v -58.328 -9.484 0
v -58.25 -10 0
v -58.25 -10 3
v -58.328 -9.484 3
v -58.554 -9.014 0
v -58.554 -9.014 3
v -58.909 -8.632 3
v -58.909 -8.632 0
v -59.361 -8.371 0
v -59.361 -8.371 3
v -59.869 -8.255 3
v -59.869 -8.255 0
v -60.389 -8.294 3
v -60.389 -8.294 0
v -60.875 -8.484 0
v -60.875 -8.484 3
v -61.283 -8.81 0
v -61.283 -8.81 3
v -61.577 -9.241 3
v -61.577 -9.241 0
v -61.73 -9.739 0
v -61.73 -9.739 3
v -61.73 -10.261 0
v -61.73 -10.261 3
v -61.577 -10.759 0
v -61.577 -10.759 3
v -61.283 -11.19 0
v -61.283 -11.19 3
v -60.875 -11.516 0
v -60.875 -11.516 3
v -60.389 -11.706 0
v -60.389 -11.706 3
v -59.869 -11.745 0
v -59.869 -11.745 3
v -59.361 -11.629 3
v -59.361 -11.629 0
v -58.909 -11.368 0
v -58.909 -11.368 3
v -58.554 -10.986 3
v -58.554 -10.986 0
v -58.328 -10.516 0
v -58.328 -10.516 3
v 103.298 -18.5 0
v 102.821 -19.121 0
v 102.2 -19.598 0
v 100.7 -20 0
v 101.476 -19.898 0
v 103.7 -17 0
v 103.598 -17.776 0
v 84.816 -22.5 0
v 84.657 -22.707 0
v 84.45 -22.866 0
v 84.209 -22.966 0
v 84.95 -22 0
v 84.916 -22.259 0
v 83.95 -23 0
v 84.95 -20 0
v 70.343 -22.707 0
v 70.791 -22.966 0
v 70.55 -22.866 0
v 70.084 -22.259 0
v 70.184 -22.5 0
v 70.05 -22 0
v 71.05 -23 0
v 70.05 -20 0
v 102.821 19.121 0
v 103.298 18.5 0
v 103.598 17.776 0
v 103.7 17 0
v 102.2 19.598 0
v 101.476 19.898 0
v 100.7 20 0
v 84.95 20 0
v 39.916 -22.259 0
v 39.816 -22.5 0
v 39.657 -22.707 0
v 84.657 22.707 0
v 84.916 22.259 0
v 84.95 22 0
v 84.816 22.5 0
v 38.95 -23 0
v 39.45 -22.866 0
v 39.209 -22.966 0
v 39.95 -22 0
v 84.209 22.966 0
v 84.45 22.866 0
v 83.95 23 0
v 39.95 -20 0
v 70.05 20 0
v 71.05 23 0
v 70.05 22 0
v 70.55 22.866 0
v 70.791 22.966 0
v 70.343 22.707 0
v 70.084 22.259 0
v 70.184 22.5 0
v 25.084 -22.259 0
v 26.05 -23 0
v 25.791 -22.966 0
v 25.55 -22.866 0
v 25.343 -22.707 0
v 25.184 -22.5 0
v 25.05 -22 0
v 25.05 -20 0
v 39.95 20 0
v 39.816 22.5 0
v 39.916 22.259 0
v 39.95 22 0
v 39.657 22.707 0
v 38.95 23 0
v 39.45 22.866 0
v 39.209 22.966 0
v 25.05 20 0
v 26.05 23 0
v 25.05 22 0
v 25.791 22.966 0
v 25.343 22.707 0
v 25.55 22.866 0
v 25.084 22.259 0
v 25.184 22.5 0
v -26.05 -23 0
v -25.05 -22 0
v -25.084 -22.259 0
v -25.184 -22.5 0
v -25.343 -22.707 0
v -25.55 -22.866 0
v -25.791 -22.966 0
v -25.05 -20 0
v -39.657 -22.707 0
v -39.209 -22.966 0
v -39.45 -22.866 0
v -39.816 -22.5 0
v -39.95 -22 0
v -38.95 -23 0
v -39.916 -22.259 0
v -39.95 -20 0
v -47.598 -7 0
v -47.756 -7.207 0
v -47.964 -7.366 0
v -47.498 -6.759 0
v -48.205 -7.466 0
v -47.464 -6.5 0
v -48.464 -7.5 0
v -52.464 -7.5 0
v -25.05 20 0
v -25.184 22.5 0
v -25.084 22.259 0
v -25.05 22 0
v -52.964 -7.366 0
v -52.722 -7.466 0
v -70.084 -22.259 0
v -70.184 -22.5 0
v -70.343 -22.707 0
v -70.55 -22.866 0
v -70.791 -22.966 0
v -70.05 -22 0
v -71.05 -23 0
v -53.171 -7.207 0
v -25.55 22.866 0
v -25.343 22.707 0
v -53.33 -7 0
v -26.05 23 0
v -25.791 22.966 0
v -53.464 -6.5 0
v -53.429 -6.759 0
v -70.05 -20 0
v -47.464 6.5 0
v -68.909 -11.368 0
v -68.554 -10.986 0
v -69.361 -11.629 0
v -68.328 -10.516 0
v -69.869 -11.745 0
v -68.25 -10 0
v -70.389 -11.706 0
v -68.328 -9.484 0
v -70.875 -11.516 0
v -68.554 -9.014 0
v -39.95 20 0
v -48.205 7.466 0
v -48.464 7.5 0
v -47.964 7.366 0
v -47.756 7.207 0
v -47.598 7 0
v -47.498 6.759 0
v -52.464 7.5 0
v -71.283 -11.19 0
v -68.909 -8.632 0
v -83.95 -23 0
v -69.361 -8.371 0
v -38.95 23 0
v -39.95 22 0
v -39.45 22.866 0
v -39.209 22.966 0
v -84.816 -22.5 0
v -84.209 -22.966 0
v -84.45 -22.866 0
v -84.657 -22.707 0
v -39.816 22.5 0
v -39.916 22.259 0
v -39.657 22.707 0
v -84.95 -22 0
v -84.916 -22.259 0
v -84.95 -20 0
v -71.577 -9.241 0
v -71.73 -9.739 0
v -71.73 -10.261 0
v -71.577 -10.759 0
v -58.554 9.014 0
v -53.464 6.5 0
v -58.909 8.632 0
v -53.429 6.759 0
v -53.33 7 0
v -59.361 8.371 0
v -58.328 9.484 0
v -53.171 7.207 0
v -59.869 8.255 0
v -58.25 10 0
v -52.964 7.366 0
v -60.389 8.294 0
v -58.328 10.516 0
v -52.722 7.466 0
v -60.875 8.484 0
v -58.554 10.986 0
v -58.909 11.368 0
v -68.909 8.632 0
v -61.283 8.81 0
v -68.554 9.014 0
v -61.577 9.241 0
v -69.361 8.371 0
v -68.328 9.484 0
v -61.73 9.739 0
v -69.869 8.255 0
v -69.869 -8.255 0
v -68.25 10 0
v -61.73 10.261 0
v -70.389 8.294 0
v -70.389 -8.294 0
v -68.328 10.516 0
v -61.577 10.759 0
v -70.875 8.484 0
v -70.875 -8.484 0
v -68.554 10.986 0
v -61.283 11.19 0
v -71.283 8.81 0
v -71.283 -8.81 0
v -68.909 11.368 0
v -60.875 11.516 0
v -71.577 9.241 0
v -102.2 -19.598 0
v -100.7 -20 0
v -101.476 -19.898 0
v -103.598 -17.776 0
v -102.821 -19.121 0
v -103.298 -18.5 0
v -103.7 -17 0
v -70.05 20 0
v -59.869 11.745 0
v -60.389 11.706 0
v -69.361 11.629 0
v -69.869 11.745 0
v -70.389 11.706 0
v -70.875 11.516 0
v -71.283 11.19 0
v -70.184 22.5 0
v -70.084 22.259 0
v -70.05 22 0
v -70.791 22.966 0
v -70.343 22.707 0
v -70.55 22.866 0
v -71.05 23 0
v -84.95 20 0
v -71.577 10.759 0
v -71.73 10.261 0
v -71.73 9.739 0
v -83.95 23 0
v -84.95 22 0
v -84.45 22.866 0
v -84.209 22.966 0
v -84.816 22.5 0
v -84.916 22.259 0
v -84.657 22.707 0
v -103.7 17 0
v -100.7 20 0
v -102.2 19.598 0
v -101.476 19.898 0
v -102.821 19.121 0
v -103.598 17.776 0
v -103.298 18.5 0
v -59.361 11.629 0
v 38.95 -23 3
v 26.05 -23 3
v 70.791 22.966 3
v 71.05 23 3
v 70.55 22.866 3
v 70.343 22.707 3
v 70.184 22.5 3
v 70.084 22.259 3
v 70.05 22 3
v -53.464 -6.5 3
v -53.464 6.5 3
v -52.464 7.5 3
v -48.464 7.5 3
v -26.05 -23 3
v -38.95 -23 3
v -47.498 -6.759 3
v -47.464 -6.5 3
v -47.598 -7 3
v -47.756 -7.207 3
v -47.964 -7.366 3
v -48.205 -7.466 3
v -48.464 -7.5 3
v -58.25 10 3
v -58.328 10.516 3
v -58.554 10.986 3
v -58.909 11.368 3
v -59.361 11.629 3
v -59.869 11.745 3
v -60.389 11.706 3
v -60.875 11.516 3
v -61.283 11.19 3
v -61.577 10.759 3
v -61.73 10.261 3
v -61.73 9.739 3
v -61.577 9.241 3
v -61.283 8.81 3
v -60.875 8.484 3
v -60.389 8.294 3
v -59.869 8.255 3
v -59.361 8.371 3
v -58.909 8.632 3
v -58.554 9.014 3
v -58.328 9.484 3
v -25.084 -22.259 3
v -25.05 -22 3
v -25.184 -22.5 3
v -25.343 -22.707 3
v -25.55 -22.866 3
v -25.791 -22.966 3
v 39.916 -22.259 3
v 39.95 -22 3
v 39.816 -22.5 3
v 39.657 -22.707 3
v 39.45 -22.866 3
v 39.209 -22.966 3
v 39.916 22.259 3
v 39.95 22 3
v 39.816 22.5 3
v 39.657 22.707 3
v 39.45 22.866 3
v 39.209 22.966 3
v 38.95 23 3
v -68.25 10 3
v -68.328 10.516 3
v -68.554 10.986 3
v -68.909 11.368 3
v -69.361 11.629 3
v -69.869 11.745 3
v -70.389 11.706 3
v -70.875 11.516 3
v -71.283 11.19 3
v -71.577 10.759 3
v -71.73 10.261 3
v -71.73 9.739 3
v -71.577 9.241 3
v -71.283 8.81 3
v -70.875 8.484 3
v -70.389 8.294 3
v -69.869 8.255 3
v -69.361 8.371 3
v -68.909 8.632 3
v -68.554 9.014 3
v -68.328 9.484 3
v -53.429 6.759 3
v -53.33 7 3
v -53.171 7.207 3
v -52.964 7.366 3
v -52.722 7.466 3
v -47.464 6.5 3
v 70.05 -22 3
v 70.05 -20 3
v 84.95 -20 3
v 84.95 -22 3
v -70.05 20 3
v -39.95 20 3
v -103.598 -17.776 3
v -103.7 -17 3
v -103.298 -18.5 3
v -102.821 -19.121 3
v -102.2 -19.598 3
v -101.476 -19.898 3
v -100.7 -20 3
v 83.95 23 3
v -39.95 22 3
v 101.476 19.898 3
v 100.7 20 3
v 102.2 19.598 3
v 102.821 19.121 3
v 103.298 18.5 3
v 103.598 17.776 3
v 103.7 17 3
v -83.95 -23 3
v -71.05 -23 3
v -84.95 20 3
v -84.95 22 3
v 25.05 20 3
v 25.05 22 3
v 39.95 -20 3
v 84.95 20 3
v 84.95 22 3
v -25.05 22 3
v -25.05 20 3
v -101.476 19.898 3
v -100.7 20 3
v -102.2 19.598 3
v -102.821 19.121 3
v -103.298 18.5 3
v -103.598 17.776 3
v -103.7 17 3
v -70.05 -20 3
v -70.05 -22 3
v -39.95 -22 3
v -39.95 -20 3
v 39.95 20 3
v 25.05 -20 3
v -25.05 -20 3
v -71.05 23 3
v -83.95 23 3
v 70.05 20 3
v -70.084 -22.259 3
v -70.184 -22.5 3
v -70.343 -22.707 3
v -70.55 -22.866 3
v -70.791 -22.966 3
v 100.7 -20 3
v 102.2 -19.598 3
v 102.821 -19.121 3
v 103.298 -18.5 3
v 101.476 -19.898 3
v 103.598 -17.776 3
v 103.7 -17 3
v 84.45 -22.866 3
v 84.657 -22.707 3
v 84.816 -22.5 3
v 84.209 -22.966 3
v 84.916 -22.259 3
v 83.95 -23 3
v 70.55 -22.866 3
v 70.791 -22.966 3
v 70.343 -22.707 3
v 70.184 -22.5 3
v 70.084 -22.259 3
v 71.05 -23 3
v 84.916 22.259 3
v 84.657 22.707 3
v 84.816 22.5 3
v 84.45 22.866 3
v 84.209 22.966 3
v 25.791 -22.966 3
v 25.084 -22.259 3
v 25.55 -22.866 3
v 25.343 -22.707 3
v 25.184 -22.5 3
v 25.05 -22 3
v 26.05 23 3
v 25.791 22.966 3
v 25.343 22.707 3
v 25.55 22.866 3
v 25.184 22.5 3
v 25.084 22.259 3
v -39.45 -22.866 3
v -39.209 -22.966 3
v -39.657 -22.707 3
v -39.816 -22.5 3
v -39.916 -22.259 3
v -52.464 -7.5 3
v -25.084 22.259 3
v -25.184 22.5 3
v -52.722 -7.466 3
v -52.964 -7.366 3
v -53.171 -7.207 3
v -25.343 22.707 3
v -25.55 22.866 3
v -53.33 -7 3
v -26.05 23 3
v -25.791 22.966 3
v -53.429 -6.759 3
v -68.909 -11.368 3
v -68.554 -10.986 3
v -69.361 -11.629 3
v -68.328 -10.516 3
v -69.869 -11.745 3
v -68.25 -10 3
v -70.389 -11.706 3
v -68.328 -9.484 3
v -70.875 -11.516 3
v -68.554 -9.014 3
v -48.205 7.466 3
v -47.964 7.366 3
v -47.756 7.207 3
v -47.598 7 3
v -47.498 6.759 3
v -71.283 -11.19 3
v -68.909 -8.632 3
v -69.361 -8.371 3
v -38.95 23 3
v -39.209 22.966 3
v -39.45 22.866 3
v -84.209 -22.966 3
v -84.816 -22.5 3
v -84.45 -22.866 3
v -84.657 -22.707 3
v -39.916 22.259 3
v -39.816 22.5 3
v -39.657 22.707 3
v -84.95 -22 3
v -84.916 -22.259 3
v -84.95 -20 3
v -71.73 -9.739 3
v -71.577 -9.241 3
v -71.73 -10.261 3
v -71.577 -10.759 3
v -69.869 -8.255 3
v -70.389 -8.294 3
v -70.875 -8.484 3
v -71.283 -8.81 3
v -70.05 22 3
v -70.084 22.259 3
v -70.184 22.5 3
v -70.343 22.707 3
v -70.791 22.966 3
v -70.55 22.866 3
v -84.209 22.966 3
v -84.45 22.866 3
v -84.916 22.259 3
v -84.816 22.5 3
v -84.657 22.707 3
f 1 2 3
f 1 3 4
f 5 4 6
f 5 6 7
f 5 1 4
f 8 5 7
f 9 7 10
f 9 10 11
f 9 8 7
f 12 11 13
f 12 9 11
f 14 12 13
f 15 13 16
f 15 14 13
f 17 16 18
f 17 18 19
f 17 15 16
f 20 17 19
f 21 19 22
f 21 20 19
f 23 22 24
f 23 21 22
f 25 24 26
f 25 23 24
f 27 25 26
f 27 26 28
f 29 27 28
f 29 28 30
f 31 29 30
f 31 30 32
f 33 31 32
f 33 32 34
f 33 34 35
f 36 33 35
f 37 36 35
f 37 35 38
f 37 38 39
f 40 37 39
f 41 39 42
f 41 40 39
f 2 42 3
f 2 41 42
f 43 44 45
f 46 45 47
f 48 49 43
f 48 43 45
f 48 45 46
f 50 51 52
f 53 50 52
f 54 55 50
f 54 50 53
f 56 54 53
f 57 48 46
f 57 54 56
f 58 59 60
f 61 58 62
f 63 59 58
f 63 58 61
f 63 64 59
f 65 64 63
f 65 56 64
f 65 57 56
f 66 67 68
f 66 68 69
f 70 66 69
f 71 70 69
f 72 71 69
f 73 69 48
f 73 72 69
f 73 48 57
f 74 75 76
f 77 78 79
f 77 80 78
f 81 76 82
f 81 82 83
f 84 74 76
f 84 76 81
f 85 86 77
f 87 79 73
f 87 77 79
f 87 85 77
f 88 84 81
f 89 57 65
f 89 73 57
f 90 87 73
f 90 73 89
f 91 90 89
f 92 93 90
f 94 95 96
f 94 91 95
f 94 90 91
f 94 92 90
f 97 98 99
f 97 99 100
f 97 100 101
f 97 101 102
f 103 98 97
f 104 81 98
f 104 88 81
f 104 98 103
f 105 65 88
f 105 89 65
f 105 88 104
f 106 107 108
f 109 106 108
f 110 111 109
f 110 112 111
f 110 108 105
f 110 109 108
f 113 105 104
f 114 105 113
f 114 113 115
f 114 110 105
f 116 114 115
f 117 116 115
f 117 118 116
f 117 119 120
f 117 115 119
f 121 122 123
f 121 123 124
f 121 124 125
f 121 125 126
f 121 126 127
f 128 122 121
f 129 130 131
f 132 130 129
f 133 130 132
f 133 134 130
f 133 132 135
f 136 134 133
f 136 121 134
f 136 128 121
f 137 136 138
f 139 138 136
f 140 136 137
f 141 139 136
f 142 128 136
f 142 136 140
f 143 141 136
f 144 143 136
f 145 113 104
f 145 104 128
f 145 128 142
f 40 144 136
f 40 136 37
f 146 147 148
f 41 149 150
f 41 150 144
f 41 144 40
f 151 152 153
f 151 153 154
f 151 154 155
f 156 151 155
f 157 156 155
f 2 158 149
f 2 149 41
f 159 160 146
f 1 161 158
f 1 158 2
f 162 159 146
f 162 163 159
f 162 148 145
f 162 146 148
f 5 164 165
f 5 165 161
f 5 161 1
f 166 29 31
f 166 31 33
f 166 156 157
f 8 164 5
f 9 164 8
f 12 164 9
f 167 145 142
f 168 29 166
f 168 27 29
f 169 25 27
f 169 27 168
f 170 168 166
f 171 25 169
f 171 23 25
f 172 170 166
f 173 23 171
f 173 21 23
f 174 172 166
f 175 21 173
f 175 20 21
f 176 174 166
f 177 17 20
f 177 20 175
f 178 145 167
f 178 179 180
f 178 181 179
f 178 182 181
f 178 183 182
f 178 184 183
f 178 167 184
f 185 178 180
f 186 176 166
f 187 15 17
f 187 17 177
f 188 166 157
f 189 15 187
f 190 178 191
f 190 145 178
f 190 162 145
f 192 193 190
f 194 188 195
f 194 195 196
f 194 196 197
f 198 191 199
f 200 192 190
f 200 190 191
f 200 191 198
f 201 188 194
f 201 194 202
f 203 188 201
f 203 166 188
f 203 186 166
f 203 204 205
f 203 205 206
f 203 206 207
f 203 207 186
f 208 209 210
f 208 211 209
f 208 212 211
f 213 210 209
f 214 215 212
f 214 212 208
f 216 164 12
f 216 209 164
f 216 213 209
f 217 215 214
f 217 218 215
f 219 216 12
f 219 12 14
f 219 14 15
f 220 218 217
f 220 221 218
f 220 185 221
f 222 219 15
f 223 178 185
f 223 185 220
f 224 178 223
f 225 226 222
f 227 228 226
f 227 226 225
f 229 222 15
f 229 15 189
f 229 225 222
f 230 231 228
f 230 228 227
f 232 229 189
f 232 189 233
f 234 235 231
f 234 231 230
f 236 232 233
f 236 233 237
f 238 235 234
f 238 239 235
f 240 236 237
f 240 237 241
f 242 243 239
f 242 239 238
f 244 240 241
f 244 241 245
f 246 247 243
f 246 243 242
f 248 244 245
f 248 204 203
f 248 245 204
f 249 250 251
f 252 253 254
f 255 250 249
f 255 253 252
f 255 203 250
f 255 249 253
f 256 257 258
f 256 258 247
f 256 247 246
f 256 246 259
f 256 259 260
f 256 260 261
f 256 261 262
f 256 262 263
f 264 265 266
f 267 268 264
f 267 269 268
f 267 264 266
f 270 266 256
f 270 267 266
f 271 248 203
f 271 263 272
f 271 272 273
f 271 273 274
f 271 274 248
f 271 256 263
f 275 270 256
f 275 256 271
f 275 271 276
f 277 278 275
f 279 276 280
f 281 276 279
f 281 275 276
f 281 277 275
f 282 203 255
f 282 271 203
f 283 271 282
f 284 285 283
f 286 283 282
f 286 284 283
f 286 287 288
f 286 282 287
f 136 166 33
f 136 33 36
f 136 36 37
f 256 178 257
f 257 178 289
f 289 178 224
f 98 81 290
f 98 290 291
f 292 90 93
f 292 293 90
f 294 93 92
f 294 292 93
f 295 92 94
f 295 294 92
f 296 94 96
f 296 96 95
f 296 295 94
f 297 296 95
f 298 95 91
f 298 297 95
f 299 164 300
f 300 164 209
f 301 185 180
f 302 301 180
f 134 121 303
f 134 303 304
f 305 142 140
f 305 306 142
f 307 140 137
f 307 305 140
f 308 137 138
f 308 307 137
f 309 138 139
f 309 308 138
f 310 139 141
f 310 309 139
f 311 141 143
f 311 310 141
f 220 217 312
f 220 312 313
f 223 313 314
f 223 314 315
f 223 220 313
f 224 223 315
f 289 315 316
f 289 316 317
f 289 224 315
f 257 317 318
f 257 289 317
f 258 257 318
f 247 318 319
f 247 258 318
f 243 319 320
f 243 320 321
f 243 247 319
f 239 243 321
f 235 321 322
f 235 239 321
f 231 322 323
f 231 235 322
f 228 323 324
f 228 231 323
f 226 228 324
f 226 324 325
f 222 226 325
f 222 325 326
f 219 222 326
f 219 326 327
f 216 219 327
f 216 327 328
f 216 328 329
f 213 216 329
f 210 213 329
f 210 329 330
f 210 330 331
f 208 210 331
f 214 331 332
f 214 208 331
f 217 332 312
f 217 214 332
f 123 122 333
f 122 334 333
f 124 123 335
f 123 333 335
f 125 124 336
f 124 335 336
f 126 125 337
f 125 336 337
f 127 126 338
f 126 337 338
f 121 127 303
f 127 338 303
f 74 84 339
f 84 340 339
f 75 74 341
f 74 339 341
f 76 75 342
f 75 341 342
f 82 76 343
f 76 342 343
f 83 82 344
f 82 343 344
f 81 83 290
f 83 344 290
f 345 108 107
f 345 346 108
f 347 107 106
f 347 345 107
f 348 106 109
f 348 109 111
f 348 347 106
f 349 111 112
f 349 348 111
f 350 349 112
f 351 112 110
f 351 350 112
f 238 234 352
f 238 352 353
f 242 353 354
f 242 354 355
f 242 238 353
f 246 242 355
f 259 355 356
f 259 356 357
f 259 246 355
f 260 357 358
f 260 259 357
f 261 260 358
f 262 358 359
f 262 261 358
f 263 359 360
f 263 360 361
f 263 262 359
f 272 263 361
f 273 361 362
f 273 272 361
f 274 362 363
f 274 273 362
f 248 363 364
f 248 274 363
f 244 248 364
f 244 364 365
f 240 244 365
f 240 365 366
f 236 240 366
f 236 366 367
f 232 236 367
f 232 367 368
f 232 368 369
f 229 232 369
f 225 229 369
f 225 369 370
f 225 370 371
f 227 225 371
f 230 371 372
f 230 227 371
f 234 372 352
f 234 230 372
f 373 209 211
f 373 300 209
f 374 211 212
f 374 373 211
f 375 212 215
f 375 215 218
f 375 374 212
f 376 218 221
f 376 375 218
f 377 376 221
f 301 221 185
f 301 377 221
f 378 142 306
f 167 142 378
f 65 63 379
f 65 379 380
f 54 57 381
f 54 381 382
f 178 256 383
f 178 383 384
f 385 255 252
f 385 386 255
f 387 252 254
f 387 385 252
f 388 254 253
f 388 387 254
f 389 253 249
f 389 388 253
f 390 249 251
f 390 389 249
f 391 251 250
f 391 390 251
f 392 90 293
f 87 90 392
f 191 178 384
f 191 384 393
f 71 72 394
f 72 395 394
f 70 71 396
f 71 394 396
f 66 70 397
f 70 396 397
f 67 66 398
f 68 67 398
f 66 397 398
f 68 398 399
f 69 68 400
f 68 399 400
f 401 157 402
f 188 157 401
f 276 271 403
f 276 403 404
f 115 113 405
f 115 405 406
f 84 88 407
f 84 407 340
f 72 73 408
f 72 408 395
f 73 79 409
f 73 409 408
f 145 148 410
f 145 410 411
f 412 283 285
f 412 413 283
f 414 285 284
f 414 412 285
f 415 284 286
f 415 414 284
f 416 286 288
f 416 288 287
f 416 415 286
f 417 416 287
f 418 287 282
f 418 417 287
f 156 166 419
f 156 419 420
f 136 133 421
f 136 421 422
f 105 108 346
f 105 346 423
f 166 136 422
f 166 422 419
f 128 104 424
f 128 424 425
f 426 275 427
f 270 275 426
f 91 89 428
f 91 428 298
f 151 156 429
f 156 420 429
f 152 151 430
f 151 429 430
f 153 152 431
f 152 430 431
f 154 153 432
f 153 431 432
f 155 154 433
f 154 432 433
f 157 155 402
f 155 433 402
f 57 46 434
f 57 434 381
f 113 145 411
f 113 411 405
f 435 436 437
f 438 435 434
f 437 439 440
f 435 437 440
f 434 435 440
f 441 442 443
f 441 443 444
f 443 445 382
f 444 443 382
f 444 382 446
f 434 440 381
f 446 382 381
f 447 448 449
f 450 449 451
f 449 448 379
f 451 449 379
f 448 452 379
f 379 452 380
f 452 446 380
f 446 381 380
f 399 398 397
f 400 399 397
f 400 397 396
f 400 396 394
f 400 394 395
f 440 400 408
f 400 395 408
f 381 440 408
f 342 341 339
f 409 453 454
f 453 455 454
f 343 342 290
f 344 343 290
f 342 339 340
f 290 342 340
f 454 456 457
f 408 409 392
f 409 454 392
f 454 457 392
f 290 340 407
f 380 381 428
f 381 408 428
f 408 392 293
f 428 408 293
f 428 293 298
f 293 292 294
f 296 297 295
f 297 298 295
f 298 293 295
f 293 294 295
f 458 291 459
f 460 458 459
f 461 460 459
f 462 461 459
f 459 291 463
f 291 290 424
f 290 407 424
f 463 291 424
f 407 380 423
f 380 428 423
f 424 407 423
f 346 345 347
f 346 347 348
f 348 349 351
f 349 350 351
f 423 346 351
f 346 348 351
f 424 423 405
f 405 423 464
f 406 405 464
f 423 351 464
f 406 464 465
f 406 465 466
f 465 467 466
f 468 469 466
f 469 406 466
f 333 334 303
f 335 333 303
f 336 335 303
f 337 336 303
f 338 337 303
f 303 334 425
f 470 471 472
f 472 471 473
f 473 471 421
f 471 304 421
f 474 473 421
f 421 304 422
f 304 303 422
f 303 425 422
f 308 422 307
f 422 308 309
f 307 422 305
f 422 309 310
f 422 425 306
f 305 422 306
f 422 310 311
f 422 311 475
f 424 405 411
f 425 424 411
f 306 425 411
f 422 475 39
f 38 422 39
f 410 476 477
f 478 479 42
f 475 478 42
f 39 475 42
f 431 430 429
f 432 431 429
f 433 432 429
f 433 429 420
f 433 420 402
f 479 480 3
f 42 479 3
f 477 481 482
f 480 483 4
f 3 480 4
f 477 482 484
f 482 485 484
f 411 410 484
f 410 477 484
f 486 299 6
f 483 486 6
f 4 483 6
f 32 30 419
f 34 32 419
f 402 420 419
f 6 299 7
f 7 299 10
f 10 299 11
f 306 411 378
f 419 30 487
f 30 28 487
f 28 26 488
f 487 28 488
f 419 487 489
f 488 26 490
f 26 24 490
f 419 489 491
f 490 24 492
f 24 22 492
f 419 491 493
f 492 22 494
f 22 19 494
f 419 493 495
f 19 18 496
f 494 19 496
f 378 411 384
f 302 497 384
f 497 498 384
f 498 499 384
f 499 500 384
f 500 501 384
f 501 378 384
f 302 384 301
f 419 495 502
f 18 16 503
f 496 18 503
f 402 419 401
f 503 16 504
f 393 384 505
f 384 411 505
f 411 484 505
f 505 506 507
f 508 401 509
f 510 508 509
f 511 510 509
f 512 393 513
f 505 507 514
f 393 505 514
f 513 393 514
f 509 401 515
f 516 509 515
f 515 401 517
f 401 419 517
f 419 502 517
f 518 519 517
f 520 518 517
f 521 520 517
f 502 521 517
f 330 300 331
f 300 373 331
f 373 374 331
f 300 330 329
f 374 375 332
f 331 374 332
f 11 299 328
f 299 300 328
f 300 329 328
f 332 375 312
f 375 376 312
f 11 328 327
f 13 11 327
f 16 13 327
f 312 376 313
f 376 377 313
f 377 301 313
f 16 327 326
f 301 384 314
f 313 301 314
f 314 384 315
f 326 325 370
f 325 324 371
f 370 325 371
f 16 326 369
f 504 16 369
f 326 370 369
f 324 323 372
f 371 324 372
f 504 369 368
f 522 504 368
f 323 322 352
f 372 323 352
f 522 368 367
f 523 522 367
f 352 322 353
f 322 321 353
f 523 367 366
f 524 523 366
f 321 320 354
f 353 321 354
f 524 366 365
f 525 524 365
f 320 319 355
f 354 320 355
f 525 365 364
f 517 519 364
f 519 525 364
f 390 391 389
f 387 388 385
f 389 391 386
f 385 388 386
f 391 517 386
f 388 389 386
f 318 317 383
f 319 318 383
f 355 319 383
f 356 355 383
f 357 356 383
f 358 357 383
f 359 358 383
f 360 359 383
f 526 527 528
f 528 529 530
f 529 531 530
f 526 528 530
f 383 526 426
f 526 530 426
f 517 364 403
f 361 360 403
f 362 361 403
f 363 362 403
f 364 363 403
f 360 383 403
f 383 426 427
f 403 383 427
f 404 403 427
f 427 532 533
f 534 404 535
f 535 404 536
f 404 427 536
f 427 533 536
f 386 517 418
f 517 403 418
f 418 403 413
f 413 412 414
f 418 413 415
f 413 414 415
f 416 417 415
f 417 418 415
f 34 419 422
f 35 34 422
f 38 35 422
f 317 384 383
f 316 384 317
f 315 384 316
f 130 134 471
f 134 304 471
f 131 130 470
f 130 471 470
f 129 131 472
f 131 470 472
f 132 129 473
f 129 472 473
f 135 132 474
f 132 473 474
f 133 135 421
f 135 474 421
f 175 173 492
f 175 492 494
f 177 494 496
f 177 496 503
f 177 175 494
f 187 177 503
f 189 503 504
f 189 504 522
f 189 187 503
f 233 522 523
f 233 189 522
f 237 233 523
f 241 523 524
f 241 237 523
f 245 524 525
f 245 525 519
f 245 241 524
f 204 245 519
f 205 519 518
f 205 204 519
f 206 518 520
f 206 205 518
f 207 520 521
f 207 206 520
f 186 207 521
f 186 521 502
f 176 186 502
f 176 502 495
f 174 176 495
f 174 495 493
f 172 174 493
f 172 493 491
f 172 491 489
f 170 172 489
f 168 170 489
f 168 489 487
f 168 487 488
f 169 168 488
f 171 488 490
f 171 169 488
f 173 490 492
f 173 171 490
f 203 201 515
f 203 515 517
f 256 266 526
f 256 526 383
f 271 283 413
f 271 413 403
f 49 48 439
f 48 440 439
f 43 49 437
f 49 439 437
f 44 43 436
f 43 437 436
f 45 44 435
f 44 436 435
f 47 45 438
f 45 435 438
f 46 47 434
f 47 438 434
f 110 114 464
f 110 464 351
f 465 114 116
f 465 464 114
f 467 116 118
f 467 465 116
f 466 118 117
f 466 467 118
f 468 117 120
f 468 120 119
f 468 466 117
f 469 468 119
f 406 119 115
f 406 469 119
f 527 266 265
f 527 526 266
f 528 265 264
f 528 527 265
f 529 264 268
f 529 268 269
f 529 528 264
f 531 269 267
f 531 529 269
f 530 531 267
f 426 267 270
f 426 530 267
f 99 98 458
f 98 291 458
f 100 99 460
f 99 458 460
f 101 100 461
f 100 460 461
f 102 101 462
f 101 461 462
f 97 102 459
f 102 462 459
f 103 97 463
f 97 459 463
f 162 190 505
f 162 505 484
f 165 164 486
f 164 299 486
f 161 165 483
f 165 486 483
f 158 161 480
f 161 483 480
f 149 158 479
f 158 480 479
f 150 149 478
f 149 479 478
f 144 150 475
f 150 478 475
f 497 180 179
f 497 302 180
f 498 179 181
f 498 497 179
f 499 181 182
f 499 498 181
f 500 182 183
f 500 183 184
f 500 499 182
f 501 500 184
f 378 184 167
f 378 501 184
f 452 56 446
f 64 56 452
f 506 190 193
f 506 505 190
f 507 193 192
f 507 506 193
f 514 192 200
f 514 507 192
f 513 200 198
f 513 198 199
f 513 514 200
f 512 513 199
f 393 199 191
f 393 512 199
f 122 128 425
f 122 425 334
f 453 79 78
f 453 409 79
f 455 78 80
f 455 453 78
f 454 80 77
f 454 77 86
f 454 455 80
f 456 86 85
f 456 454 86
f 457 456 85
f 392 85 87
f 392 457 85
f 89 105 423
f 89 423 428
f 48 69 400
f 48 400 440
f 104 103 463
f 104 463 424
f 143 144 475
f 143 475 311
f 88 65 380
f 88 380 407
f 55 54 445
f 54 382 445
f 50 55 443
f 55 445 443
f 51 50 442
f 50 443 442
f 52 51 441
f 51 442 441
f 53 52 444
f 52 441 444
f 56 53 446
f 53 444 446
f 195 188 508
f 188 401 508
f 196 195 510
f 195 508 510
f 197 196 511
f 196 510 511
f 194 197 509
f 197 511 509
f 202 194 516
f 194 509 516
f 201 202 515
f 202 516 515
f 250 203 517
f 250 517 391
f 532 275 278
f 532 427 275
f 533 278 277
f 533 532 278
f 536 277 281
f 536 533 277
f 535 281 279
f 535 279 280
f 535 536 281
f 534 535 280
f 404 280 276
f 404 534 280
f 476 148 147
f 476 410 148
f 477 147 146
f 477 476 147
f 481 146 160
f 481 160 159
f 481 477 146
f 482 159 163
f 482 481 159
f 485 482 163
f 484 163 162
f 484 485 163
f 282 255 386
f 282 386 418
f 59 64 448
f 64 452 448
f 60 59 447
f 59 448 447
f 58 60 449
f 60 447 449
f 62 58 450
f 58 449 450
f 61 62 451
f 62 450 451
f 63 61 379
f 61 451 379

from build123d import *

# Parameters (mm, degrees)
SKETCH_R    = 1.75
SKETCH_W    = 6
SKETCH_H    = 15
PAD_DEPTH   = 3
FILLET_R    = 3
FILLET001_R = 1


with BuildPart() as part:
    # Sketch → Pad (new body)
    with BuildSketch(Plane.XY):
        Polygon((25.05, 23), (39.95, 23), (39.95, 20), (70.05, 20), (70.05, 23), (84.95, 23), (84.95, 20), (103.7, 20), (103.7, -20), (84.95, -20), (84.95, -23), (70.05, -23), (70.05, -20), (39.95, -20), (39.95, -23), (25.05, -23), (25.05, -20), (-25.05, -20), (-25.05, -23), (-39.95, -23), (-39.95, -20), (-70.05, -20), (-70.05, -23), (-84.95, -23), (-84.95, -20), (-103.7, -20), (-103.7, 20), (-84.95, 20), (-84.95, 23), (-70.05, 23), (-70.05, 20), (-39.95, 20), (-39.95, 23), (-25.05, 23), (-25.05, 20), (25.05, 20), align=None)
        with Locations((-70, 10)):
            Circle(SKETCH_R, mode=Mode.SUBTRACT)
        with Locations((-60, 10)):
            Circle(SKETCH_R, mode=Mode.SUBTRACT)
        with Locations((-70, -10)):
            Circle(SKETCH_R, mode=Mode.SUBTRACT)
        with Locations((-60, -10)):
            Circle(SKETCH_R, mode=Mode.SUBTRACT)
        with Locations((-50.463539, 0)):
            Rectangle(SKETCH_W, SKETCH_H, mode=Mode.SUBTRACT)
    extrude(amount=PAD_DEPTH)

    # Fillet
    fillet_edges = [part.edges().sort_by_distance(p)[0] for p in [
        (-103.7, 20, 1.5),
        (103.7, 20, 1.5),
        (103.7, -20, 1.5),
        (-103.7, -20, 1.5),
    ]]
    fillet(fillet_edges, radius=FILLET_R)

    # Fillet001
    fillet001_edges = [part.edges().sort_by_distance(p)[0] for p in [
        (-84.95, 23, 1.5),
        (-70.05, 23, 1.5),
        (-84.95, -23, 1.5),
        (-39.95, 23, 1.5),
        (-70.05, -23, 1.5),
        (-25.05, 23, 1.5),
        (-39.95, -23, 1.5),
        (25.05, 23, 1.5),
        (-25.05, -23, 1.5),
        (39.95, 23, 1.5),
        (25.05, -23, 1.5),
        (70.05, 23, 1.5),
        (39.95, -23, 1.5),
        (84.95, 23, 1.5),
        (70.05, -23, 1.5),
        (84.95, -23, 1.5),
        (-53.463539, -7.5, 1.5),
        (-53.463539, 7.5, 1.5),
        (-47.463539, -7.5, 1.5),
        (-47.463539, 7.5, 1.5),
    ]]
    fillet(fillet001_edges, radius=FILLET001_R)


solid = part.part
